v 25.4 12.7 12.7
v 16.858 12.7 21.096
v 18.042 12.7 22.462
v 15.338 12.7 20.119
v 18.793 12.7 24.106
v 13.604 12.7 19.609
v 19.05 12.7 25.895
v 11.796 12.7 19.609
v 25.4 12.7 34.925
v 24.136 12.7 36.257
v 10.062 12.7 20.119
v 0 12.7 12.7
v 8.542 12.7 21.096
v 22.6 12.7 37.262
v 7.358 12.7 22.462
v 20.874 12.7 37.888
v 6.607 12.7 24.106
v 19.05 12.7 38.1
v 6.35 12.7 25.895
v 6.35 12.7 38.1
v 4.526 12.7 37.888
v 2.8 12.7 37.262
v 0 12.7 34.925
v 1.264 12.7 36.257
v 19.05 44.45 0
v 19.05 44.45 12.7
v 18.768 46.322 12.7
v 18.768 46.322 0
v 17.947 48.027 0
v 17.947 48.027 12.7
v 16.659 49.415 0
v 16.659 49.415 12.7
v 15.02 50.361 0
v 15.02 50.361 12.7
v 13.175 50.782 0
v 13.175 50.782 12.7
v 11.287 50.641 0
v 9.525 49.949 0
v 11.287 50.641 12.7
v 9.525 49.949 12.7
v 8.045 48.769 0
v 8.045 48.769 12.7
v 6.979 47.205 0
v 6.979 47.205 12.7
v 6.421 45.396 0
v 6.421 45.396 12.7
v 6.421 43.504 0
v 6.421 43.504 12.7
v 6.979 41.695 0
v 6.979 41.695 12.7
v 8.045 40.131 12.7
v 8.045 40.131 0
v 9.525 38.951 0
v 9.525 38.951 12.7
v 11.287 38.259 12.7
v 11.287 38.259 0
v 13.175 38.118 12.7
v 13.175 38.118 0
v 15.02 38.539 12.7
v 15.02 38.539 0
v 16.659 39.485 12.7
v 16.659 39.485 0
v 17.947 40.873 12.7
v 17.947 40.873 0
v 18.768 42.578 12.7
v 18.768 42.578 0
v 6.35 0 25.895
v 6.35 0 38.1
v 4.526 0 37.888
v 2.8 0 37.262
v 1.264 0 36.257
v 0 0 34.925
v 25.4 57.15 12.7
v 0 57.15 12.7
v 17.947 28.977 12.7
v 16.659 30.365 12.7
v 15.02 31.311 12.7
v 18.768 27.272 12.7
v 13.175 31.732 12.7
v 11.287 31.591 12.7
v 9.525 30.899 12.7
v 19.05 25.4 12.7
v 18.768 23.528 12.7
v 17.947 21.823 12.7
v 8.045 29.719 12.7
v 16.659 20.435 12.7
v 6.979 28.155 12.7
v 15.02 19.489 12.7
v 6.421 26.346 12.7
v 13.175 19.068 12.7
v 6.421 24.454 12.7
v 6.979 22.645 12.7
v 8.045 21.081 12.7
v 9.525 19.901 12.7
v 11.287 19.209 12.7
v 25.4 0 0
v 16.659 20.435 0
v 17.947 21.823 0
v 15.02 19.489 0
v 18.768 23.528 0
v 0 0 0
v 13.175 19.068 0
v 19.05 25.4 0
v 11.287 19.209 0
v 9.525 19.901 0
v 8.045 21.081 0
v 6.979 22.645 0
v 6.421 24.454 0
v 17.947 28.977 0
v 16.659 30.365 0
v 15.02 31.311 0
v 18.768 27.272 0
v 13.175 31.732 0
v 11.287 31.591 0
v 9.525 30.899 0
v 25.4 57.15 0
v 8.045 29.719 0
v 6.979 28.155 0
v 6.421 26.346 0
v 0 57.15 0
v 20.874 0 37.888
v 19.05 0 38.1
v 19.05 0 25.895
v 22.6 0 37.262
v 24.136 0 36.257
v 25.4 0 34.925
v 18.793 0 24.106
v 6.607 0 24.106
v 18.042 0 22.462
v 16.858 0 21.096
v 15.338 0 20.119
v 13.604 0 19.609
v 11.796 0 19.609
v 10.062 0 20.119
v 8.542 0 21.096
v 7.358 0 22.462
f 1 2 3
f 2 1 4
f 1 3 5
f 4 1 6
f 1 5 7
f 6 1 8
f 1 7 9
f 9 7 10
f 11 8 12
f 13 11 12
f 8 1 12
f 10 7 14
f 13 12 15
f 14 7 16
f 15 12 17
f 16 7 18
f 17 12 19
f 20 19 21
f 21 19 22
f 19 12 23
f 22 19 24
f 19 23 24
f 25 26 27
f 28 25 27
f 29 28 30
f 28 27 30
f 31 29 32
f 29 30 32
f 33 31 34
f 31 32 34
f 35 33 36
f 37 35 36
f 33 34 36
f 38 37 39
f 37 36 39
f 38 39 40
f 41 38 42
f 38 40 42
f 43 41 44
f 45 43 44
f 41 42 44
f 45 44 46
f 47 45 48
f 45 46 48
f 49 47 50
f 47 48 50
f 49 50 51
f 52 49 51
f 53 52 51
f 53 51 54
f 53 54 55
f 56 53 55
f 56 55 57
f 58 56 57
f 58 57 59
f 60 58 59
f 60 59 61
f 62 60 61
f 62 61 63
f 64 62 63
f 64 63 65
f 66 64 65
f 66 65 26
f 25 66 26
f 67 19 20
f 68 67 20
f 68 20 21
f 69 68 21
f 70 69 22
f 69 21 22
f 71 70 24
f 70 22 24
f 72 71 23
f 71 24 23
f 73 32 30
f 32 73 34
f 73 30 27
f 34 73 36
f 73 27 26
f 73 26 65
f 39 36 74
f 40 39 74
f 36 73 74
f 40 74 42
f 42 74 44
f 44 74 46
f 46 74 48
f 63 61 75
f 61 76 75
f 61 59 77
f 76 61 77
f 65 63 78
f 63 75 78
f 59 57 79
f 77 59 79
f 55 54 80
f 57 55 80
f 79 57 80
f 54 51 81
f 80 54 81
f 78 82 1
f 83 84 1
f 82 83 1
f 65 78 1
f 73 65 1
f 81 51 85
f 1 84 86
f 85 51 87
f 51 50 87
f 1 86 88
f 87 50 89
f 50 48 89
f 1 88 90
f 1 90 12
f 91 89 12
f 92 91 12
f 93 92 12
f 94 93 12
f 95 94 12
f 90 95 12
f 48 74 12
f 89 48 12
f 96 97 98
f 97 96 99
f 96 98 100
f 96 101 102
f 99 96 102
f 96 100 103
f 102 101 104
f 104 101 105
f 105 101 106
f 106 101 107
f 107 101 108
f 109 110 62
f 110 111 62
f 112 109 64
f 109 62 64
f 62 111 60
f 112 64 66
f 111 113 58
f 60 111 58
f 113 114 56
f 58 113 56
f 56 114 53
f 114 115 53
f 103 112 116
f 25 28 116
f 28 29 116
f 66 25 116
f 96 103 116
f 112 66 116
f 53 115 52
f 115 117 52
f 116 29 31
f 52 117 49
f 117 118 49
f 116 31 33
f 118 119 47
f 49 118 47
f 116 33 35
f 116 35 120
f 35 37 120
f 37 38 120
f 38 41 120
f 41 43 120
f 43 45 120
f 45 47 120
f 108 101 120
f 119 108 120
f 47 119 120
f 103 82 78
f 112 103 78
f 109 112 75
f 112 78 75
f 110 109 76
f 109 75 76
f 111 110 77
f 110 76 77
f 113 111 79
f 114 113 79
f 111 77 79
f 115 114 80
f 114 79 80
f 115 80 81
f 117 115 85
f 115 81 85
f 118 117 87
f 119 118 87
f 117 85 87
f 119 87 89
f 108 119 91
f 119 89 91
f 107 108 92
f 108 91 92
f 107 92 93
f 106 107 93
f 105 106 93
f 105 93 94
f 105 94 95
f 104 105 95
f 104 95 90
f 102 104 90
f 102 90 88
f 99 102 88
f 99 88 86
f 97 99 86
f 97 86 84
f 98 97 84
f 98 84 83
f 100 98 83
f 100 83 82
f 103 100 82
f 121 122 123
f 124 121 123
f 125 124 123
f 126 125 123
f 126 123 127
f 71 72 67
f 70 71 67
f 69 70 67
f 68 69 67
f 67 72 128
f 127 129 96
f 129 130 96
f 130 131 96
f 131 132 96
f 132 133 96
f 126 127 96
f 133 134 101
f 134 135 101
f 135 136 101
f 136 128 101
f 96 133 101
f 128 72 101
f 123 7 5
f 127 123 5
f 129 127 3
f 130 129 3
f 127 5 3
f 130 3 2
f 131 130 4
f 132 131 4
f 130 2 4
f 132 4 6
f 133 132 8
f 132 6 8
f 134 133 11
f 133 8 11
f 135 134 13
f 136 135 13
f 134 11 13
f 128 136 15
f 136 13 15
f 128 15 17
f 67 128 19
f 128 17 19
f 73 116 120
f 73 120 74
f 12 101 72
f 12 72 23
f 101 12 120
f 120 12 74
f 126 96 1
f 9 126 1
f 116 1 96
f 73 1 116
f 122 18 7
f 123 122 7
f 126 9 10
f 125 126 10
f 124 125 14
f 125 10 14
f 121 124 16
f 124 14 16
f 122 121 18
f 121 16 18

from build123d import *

# Parameters (mm, degrees)
F1_DEPTH = 25.4
F3_DEPTH = 25.4
F5_DEPTH = 25.4
F7_DEPTH = 25.4
F8_R     = 6.35
F9_DEPTH = 25.4


with BuildPart() as f1:
    # F0 (on Right) → F1 (new body)
    with BuildSketch(Plane.YZ):
        Polygon((0, 38.1), (0, 0), (57.15, 0), (57.15, 12.7), (12.7, 12.7), (12.7, 38.1), align=None)
    extrude(amount=F1_DEPTH)

    # F2 (on face) → F3 (cut)
    with BuildSketch(Plane(origin=(0, 12.7, 0), x_dir=(-1, 0, 0), z_dir=(0, 1, 0))):
        with BuildLine():
            ThreePointArc((-19.05, 25.8947107941), (-12.7, 19.5447107941), (-6.35, 25.8947107941))
            ThreePointArc((-6.35, 25.8947107941), (-12.7, 32.2447107941), (-19.05, 25.8947107941))
        make_face()
        with BuildLine():
            ThreePointArc((-19.05, 25.8947107941), (-12.7, 32.2447107941), (-6.35, 25.8947107941))
            Line((-6.35, 25.8947107941), (-6.35, 38.1))
            Line((-6.35, 38.1), (-19.05, 38.1))
            Line((-19.05, 38.1), (-19.05, 25.8947107941))
        make_face()
    extrude(amount=-F3_DEPTH, mode=Mode.SUBTRACT)

    # F4 (on face) → F5 (cut)
    with BuildSketch(Plane(origin=(0, 12.7, 0), x_dir=(-1, 0, 0), z_dir=(0, 1, 0))):
        with BuildLine():
            ThreePointArc((-25.4, 34.925), (-22.5997579143, 37.2620158286), (-19.05, 38.1))
            Line((-19.05, 38.1), (-25.4, 38.1))
            Line((-25.4, 38.1), (-25.4, 34.925))
        make_face()
    extrude(amount=-F5_DEPTH, mode=Mode.SUBTRACT)

    # F6 (on face) → F7 (cut)
    with BuildSketch(Plane(origin=(0, 12.7, 0), x_dir=(-1, 0, 0), z_dir=(0, 1, 0))):
        with BuildLine():
            ThreePointArc((-6.35, 38.1), (-2.8002420857, 37.2620158286), (0, 34.925))
            Line((0, 34.925), (0, 38.1))
            Line((0, 38.1), (-6.35, 38.1))
        make_face()
    extrude(amount=-F7_DEPTH, mode=Mode.SUBTRACT)

    # F8 (on face) → F9 (cut)
    with BuildSketch(Plane.XY.offset(12.7)):
        with Locations((12.7, 44.45)):
            Circle(F8_R)
        with Locations((12.7, 25.4)):
            Circle(F8_R)
    extrude(amount=-F9_DEPTH, mode=Mode.SUBTRACT)


solid = f1.part
